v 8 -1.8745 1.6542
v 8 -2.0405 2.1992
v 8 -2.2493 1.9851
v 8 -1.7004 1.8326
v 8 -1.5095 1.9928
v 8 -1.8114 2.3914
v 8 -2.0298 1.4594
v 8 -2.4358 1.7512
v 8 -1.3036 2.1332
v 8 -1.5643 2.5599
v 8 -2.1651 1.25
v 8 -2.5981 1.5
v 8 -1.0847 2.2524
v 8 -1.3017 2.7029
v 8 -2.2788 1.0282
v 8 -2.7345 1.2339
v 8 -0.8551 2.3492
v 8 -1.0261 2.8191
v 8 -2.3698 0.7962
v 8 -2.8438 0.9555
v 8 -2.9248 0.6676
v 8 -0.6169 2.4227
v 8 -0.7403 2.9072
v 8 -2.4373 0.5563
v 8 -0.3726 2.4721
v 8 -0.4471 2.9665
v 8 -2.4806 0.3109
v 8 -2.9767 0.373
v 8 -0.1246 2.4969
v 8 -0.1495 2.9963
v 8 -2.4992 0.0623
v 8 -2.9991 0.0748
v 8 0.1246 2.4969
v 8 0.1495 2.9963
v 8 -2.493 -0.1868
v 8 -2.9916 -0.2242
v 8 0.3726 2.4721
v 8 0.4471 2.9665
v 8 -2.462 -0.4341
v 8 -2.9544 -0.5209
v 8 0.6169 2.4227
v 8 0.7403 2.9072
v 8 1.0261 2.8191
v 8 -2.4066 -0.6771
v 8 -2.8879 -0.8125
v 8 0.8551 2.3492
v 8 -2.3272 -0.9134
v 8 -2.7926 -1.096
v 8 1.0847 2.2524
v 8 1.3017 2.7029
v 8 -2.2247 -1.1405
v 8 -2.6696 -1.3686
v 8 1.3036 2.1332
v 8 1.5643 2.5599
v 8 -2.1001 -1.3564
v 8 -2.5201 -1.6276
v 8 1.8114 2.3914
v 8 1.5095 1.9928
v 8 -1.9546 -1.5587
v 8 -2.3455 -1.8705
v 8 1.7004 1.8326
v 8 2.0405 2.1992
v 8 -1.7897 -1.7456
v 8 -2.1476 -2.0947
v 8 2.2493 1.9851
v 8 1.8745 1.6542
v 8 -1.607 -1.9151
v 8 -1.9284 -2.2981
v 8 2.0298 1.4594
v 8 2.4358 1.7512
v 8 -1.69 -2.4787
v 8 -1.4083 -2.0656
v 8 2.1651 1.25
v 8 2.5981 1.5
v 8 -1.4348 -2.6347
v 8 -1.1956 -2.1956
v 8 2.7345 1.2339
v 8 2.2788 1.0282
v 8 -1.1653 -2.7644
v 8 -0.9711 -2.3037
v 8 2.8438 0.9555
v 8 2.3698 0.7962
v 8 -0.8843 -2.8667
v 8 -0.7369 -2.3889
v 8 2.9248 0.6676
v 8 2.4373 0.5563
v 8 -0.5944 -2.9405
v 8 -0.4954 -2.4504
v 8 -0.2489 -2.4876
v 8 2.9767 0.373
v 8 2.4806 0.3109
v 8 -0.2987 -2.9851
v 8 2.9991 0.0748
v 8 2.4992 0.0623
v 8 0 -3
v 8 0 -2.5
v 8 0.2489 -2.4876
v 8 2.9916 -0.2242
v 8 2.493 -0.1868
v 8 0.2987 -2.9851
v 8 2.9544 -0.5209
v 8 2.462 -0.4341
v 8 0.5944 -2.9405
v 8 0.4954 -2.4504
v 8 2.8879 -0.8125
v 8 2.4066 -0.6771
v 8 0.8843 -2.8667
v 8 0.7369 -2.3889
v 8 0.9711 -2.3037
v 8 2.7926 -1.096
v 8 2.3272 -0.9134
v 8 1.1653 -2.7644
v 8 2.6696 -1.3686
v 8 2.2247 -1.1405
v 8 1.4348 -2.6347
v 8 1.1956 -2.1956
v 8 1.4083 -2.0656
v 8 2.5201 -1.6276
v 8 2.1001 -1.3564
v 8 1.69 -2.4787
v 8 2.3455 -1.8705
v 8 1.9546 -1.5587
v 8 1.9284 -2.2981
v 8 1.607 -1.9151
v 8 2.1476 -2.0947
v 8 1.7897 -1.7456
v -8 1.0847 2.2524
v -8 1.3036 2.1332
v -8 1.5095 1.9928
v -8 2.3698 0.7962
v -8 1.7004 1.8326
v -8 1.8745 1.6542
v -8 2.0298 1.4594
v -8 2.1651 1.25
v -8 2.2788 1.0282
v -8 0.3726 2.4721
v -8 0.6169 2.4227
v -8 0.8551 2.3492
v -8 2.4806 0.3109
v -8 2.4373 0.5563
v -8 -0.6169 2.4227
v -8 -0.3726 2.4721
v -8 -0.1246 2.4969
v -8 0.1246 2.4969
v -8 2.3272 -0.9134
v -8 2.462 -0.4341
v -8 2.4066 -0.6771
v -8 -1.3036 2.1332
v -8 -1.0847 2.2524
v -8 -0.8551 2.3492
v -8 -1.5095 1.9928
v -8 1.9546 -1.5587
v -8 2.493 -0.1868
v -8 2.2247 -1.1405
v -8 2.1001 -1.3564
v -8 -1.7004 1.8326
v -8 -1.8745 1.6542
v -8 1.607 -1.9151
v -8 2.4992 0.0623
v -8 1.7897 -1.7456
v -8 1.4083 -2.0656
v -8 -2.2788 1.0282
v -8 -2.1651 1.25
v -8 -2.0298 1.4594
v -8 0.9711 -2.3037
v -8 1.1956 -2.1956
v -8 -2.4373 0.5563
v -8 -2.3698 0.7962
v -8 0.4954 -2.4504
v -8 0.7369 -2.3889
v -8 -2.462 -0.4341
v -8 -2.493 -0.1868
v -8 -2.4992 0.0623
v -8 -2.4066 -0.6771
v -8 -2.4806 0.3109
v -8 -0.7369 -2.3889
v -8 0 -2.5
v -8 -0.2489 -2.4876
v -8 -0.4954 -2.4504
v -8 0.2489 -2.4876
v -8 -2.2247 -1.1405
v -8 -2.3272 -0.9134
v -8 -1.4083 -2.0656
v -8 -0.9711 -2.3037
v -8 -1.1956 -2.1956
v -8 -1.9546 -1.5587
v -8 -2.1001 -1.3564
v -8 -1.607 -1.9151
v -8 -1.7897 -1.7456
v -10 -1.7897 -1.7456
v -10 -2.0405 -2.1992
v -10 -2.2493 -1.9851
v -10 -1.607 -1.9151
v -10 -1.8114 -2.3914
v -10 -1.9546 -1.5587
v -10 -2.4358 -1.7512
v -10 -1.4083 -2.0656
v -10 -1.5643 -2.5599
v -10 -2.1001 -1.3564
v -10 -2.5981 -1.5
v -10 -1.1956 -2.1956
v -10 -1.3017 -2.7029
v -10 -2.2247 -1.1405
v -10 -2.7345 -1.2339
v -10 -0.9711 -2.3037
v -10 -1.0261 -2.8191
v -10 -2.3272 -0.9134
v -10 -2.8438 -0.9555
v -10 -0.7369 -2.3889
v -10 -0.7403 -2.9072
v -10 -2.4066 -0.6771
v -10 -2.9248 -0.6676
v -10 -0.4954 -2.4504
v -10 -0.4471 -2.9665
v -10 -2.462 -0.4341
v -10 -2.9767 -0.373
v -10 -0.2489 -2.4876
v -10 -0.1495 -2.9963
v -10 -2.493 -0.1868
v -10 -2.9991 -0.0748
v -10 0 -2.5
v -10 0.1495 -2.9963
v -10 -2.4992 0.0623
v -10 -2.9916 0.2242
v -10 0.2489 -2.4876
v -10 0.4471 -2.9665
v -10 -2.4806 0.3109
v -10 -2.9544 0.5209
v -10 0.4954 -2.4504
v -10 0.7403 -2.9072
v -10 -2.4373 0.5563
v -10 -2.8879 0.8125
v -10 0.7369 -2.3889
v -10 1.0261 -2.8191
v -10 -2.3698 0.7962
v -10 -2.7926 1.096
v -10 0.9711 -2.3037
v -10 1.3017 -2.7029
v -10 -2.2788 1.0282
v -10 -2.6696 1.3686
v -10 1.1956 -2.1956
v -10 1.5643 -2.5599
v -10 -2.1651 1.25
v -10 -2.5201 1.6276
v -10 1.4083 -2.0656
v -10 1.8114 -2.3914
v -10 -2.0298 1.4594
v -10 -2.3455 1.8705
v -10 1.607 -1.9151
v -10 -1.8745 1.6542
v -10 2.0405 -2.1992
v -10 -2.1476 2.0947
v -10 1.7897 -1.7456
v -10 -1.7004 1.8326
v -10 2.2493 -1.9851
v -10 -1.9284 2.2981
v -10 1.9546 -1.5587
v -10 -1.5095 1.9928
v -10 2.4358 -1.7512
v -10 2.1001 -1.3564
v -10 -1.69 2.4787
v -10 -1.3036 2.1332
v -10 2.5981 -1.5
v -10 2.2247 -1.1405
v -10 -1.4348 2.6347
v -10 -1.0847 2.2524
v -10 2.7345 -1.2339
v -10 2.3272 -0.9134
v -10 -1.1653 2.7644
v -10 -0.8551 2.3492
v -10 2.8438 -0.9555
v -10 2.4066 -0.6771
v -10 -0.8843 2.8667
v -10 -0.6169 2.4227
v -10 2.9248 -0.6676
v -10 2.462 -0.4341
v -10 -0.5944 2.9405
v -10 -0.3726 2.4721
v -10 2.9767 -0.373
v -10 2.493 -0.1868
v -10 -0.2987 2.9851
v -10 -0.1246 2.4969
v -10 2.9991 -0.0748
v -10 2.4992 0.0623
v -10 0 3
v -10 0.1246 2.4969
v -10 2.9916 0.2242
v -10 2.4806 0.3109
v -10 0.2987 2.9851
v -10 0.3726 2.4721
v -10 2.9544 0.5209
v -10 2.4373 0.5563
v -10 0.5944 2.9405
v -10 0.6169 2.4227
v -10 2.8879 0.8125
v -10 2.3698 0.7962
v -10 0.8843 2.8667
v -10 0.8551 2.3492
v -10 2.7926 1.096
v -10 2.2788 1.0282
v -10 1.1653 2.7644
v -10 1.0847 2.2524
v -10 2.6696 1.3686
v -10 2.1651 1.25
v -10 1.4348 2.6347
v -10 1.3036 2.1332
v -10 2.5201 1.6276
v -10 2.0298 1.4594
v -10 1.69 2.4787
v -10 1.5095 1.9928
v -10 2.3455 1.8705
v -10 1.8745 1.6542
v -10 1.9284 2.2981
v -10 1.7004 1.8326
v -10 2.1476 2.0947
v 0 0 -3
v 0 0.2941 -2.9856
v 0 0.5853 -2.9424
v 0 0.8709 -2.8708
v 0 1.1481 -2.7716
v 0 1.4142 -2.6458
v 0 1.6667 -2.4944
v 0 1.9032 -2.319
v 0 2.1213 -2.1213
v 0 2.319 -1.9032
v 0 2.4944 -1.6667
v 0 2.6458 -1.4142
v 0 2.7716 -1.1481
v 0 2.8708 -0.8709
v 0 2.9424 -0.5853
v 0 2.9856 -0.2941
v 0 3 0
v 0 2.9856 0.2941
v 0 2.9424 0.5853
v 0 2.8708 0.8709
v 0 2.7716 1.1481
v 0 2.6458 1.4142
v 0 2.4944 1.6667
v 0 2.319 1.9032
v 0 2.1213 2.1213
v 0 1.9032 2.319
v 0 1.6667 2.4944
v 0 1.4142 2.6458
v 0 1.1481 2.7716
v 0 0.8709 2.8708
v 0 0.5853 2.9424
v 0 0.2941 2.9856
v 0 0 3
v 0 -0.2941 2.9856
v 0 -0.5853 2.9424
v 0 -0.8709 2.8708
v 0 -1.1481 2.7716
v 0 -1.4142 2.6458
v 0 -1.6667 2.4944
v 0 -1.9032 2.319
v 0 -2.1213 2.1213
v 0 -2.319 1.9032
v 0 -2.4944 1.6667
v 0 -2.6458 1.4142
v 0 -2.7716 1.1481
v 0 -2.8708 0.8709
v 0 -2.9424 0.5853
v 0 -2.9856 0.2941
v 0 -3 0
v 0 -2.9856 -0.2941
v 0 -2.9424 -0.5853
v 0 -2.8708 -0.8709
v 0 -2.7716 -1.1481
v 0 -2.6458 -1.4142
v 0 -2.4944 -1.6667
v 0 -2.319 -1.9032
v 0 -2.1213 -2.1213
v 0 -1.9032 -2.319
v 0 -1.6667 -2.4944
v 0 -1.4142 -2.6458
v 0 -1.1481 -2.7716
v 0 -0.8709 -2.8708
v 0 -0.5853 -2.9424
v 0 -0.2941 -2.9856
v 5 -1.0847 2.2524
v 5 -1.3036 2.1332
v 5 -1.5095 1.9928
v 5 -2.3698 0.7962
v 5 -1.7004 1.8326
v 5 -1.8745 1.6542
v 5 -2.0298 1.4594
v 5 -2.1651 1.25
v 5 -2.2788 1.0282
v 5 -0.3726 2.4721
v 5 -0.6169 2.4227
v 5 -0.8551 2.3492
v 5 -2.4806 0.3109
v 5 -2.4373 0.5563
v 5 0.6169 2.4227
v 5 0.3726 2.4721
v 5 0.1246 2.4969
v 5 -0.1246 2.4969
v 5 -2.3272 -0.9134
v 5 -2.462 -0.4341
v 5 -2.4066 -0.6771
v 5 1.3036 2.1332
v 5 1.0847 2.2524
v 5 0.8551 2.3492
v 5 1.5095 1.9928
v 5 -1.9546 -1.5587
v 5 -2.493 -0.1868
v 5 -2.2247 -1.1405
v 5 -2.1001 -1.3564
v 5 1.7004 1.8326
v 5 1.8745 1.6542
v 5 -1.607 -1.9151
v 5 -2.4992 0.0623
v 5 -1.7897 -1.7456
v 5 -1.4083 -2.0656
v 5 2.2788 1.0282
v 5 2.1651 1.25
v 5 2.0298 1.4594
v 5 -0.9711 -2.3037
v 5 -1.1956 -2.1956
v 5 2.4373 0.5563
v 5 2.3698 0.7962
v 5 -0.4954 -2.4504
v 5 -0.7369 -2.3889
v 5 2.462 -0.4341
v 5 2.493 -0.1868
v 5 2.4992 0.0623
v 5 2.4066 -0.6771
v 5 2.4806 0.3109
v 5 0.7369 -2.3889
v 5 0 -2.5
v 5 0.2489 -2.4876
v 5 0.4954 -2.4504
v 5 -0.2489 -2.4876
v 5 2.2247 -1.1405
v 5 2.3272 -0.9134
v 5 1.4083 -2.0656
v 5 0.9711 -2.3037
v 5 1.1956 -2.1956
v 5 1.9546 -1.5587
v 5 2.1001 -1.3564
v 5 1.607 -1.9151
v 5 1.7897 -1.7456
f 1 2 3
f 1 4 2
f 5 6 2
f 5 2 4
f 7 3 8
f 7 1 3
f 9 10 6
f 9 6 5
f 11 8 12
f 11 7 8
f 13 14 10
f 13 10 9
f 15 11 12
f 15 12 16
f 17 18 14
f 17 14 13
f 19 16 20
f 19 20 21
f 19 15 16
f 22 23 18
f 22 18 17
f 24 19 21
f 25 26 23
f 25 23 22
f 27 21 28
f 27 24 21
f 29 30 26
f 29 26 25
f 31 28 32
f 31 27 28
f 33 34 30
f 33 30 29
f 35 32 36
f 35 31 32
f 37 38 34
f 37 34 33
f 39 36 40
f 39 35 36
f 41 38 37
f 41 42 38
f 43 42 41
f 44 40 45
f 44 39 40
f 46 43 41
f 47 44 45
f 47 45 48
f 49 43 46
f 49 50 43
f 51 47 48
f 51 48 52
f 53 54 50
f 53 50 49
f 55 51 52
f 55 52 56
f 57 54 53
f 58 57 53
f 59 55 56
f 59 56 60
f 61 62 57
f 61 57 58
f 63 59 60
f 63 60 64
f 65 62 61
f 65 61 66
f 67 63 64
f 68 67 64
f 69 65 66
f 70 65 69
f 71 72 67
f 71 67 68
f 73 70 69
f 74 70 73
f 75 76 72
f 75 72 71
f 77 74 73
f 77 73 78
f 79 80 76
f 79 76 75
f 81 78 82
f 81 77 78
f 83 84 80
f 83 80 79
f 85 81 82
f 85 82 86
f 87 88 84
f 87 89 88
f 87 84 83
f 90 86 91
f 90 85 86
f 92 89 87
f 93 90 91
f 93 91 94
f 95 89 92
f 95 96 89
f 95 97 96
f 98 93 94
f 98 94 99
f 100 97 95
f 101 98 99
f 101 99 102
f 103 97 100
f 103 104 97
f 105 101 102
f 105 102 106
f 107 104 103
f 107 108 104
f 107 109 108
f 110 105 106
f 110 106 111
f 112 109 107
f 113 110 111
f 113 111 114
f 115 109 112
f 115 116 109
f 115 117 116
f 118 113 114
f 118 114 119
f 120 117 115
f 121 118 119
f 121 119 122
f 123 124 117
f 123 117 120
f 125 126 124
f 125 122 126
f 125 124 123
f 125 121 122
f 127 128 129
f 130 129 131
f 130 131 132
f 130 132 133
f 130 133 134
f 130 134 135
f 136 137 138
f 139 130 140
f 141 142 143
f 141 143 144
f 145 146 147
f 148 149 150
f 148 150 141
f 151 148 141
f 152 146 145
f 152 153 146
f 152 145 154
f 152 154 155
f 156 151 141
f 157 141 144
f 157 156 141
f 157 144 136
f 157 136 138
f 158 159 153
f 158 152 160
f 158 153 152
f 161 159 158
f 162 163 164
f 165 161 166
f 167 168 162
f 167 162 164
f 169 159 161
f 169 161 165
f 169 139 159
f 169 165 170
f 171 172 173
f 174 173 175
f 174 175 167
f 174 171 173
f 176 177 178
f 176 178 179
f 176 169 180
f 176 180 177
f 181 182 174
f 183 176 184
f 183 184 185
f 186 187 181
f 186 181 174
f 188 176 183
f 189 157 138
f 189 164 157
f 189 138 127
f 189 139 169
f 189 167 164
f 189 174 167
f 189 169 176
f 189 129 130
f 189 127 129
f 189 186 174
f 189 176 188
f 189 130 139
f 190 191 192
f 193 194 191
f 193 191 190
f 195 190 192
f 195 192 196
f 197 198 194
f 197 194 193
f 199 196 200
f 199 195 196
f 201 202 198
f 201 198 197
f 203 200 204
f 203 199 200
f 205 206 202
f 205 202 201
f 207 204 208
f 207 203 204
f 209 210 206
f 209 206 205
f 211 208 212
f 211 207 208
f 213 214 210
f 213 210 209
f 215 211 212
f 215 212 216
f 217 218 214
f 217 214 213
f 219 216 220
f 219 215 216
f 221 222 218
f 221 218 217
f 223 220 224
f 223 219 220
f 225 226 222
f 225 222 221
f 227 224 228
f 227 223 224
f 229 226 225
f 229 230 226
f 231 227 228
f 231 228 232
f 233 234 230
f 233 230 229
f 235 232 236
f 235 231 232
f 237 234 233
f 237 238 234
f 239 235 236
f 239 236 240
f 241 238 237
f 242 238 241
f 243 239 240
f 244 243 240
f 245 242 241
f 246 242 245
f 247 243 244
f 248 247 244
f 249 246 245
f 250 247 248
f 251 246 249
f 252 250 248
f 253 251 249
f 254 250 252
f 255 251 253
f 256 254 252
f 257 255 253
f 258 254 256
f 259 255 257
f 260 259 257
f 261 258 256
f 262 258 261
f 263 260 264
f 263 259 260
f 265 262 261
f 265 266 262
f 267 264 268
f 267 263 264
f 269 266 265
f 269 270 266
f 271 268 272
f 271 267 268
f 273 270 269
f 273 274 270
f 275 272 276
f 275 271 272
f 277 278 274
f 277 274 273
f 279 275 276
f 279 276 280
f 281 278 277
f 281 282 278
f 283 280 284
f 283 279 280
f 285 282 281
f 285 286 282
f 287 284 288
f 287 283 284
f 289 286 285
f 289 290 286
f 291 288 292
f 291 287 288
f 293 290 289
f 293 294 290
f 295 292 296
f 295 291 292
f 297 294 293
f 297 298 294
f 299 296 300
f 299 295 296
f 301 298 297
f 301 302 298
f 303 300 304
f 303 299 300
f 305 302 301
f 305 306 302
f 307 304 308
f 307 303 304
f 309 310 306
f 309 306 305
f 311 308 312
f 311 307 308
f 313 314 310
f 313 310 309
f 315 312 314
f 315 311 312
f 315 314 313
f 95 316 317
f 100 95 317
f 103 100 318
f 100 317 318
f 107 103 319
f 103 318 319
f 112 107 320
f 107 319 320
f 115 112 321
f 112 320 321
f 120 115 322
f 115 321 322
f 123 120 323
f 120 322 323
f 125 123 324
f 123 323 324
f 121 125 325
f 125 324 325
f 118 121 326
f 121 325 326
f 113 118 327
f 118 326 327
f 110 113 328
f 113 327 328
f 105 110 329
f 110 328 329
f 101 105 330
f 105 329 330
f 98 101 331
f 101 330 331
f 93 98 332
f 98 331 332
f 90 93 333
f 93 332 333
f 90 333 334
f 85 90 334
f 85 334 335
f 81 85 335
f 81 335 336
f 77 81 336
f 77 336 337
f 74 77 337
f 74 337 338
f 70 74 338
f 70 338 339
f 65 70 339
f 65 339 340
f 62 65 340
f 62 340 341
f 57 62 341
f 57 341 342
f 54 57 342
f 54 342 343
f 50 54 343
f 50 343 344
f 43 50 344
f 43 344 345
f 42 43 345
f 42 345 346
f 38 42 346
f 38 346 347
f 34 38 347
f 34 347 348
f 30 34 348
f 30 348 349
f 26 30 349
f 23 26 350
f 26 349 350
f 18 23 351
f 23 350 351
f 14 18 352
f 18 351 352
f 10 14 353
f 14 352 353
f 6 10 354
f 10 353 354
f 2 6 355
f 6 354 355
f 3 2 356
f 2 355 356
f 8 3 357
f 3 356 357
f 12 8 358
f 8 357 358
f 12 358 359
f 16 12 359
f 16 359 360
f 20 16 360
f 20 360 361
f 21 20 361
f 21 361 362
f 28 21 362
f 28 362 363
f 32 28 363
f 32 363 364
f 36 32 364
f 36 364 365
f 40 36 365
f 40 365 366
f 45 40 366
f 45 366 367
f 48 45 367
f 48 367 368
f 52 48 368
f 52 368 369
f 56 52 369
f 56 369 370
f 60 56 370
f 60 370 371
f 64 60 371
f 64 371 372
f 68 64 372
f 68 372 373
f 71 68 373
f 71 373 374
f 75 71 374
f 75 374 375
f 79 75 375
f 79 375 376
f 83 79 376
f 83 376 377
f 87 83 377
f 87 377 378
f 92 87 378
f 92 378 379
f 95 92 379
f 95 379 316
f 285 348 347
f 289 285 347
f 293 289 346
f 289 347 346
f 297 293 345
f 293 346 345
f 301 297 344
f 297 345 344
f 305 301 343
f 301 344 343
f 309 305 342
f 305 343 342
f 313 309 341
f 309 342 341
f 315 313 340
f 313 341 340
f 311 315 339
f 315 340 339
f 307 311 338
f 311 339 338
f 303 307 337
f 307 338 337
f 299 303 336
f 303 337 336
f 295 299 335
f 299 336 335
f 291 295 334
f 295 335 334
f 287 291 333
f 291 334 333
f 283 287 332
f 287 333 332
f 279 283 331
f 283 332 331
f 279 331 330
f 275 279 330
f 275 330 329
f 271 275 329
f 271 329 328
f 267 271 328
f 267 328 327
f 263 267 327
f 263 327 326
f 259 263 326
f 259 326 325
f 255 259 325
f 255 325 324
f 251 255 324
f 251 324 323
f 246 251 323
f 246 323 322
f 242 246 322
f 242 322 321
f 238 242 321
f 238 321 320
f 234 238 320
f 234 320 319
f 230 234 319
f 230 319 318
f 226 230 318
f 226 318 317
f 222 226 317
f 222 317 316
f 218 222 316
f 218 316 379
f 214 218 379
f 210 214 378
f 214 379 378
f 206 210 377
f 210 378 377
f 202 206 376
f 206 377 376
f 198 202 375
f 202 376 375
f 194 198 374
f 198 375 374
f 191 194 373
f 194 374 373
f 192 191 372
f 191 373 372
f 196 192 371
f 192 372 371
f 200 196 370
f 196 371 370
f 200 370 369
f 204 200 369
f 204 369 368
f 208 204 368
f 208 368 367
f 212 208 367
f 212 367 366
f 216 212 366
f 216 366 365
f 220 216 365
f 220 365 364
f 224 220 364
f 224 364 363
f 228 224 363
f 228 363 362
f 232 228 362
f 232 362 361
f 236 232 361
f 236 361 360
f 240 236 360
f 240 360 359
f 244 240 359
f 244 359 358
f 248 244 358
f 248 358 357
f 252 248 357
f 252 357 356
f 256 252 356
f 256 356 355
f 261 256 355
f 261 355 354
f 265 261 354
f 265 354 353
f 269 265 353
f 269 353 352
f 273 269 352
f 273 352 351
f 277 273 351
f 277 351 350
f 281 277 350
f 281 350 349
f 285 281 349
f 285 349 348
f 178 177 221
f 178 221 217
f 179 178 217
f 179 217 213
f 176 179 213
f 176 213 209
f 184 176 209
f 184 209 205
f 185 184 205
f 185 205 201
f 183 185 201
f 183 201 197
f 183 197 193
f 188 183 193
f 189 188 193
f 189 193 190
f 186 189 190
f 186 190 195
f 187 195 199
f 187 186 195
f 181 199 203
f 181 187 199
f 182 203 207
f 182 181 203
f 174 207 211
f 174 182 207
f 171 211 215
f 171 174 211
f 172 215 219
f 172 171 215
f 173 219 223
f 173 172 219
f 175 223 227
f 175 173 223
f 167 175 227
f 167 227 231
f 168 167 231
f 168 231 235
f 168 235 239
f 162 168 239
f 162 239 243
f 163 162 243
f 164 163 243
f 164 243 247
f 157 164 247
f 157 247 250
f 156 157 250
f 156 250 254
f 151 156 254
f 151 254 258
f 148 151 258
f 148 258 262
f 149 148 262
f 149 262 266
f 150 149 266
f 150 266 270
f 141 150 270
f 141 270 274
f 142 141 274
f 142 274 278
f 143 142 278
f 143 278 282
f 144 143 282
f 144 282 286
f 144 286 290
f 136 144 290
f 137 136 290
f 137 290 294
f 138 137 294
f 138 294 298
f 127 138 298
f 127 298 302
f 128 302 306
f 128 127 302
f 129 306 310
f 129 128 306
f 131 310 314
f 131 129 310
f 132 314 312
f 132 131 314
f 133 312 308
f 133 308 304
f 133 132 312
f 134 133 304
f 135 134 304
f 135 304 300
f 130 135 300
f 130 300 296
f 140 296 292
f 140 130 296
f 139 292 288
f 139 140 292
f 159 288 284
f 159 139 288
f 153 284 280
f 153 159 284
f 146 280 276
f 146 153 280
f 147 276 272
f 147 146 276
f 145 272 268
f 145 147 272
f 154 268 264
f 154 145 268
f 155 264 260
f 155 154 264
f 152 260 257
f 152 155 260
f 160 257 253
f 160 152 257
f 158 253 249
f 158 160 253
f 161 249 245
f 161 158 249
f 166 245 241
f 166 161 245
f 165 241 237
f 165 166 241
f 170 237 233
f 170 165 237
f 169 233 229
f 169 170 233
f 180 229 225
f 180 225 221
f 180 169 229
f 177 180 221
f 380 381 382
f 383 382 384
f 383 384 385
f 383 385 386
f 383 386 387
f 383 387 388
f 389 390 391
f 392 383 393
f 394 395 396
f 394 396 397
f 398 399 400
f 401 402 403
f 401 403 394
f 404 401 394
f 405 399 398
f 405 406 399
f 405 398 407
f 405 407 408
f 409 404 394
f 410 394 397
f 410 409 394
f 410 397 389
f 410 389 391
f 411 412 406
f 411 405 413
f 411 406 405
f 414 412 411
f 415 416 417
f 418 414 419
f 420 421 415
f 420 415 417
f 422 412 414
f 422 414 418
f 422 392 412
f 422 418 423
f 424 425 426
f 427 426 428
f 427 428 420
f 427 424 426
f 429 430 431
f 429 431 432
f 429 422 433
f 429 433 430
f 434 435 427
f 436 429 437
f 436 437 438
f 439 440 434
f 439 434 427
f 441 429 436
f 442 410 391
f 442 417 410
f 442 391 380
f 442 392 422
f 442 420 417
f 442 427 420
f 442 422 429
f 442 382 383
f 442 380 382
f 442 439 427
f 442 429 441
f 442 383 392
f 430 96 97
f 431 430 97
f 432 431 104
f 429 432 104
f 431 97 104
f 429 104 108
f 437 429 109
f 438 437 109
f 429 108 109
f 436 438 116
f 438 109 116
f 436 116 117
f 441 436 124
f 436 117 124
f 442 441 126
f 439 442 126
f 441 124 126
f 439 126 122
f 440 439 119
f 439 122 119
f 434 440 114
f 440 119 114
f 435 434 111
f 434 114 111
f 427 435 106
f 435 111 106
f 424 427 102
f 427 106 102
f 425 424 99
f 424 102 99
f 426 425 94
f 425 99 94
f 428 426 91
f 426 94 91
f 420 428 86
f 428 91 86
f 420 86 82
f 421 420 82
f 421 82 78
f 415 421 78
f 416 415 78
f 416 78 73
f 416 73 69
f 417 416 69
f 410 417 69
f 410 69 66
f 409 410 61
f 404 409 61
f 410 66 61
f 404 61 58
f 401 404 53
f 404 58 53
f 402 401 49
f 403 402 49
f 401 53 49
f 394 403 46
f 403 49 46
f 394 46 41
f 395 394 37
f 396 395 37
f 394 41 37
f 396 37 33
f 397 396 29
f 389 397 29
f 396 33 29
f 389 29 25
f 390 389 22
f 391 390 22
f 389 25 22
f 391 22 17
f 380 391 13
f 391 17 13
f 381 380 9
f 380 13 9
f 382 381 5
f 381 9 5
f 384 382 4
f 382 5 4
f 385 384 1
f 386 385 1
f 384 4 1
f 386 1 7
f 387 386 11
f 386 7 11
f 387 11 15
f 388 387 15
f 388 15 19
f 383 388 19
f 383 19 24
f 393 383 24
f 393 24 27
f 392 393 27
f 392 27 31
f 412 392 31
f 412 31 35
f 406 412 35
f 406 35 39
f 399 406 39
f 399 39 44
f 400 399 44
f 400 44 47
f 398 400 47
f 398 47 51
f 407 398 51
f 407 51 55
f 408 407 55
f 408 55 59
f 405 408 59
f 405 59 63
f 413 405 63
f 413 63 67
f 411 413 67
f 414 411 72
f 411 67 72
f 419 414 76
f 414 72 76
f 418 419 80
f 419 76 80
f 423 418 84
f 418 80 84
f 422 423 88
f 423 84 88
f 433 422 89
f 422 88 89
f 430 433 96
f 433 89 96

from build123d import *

# Parameters (mm, degrees)
SKETCH1_R           = 3
BOSS_EXTRUDE1_DEPTH = 8
SKETCH2_R           = 2.5
CUT_EXTRUDE1_DEPTH  = 3
CUT_EXTRUDE2_START  = -2
SKETCH3_R           = 2.5
CUT_EXTRUDE2_DEPTH  = 2
SKETCH4_R           = 2.5
BOSS_EXTRUDE2_DEPTH = 10
SKETCH5_R           = 3
SKETCH5_R_2         = 2.5
BOSS_EXTRUDE3_DEPTH = 10


with BuildPart() as part:
    # Sketch1 → Boss-Extrude1 (new body)
    with BuildSketch(Plane(origin=(0, 0, 0), x_dir=(0, 0, -1), z_dir=(1, 0, 0))):
        Circle(SKETCH1_R)
    extrude(amount=BOSS_EXTRUDE1_DEPTH)

    # Sketch2 → Cut-Extrude1 (cut)
    with BuildSketch(Plane(origin=(8, 0, 0), x_dir=(0, 0, -1), z_dir=(1, 0, 0))):
        Circle(SKETCH2_R)
    extrude(amount=-CUT_EXTRUDE1_DEPTH, mode=Mode.SUBTRACT)

    # Sketch3 → Cut-Extrude2 (cut)
    with BuildSketch(Plane.ZY.offset(CUT_EXTRUDE2_START)):
        with Locations(Location((0, 0, 0), (0, 0, 180))):
            Circle(SKETCH3_R)
    extrude(amount=CUT_EXTRUDE2_DEPTH, mode=Mode.SUBTRACT)

    # Sketch4 → Boss-Extrude2 (add)
    with BuildSketch(Plane.ZY.offset(-2)):
        with Locations(Location((0, 0, 0), (0, 0, 180))):
            Circle(SKETCH4_R)
    extrude(amount=BOSS_EXTRUDE2_DEPTH)

    # Sketch5 → Boss-Extrude3 (add)
    with BuildSketch(Plane.ZY):
        Circle(SKETCH5_R)
        with Locations(Location((0, 0, 0), (0, 0, 180))):
            Circle(SKETCH5_R_2, mode=Mode.SUBTRACT)
    extrude(amount=BOSS_EXTRUDE3_DEPTH)


solid = part.part
